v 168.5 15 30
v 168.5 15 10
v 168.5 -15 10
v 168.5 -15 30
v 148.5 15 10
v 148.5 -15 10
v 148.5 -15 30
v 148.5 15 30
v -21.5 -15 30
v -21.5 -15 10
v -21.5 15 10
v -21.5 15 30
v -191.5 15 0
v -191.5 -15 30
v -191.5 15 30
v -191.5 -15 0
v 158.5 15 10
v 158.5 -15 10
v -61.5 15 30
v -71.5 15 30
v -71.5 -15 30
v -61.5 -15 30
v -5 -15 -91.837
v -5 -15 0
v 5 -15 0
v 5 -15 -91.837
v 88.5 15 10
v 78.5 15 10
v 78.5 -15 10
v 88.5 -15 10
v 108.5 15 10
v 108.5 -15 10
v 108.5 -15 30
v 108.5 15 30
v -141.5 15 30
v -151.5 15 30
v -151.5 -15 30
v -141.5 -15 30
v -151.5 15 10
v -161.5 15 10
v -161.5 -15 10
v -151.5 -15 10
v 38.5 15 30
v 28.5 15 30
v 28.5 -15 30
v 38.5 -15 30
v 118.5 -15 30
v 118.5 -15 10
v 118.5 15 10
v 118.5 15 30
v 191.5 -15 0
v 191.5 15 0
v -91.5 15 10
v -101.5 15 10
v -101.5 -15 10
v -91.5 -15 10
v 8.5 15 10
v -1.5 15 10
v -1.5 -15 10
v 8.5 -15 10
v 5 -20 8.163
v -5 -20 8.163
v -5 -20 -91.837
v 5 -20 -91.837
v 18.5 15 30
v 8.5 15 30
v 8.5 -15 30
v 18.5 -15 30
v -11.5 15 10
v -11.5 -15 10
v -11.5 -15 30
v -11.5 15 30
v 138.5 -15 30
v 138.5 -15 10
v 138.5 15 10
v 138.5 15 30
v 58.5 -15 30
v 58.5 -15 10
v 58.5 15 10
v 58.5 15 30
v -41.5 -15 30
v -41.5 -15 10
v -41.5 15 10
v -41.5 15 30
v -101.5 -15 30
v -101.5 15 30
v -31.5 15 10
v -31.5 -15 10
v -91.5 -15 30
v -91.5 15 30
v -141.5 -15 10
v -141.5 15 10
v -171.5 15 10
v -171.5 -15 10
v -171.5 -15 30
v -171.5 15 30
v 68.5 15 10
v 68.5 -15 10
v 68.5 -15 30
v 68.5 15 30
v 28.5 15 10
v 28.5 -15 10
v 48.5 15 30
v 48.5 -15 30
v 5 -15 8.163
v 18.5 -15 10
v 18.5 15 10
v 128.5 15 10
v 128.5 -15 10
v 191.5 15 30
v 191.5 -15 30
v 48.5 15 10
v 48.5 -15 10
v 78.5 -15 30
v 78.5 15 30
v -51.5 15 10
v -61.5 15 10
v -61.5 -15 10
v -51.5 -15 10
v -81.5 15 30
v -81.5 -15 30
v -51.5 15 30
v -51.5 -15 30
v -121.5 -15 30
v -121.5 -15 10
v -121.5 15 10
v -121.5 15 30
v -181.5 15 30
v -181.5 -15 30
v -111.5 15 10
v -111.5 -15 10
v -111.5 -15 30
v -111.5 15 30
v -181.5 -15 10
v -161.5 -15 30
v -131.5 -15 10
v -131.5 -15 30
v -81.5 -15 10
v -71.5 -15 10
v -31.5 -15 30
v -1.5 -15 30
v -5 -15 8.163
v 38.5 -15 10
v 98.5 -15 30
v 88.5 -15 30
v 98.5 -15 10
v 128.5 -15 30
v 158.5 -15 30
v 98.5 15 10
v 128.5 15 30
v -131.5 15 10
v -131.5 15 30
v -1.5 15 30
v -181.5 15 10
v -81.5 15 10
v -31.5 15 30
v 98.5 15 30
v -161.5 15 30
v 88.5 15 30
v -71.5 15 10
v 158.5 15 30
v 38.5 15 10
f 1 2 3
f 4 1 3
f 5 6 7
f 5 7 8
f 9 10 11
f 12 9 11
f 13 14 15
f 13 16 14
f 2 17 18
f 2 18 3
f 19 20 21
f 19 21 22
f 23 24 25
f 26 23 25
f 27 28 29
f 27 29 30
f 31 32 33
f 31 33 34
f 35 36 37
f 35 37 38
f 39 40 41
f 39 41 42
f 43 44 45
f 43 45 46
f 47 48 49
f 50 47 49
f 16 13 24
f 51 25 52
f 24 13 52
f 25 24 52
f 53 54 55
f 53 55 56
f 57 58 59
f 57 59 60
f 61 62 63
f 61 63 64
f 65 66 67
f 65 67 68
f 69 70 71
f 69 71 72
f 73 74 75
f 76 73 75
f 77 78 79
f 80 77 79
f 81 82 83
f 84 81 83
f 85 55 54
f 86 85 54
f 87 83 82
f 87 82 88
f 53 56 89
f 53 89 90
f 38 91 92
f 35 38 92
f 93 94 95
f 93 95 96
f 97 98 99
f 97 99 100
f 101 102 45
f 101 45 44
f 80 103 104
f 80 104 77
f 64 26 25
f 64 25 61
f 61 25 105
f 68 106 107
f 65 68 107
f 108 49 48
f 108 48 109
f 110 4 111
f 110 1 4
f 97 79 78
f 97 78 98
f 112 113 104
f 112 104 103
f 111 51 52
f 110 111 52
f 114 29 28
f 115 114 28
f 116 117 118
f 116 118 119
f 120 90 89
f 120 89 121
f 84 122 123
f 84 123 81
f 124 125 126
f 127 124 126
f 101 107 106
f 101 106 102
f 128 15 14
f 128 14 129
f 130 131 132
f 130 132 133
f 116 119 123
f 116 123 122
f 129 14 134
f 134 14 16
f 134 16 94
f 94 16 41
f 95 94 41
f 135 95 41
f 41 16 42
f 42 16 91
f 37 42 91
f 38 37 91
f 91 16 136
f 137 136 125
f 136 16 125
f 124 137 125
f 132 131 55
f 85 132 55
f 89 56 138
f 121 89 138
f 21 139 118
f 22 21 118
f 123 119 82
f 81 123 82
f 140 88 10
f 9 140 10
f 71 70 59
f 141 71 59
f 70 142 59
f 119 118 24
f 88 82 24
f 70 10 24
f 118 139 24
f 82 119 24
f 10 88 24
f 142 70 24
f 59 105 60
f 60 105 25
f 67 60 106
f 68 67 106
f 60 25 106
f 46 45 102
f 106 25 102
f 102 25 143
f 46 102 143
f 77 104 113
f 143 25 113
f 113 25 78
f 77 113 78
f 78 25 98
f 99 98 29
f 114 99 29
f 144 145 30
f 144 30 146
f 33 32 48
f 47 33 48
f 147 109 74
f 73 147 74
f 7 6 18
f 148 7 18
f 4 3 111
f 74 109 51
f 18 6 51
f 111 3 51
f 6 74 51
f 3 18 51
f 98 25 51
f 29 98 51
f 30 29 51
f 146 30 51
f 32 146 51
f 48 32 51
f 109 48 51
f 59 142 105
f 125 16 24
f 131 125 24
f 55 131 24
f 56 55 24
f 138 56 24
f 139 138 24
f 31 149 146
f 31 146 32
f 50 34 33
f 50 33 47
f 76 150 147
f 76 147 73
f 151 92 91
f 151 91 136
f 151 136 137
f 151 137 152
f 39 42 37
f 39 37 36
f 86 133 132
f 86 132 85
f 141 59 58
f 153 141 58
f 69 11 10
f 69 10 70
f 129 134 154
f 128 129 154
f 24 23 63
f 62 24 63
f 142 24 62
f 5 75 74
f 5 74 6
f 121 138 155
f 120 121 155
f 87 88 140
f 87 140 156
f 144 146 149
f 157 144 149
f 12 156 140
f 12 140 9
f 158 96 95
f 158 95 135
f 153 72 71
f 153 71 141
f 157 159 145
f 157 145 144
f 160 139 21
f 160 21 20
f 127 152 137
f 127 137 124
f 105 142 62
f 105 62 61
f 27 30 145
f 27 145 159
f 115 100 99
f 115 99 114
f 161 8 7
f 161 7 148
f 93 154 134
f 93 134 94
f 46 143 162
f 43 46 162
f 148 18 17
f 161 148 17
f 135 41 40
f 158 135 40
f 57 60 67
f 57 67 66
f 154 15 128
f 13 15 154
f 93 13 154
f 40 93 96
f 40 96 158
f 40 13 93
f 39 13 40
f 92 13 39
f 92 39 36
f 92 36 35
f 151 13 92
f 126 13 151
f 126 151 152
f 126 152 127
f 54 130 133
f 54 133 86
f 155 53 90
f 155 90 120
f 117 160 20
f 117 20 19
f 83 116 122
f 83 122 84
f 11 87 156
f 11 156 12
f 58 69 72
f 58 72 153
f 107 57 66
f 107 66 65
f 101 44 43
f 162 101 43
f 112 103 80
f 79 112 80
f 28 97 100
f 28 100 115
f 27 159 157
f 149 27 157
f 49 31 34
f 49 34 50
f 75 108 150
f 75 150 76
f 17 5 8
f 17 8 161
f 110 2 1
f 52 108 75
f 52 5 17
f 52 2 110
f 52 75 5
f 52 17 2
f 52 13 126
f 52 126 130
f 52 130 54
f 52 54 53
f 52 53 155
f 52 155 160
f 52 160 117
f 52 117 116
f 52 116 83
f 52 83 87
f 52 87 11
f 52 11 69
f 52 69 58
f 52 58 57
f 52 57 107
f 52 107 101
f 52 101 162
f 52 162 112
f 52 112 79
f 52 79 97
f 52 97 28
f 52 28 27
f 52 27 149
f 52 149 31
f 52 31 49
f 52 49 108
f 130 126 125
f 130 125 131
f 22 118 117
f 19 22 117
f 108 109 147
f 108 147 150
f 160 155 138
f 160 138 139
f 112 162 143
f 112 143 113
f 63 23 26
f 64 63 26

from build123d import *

# Parameters (mm, degrees)
ESQUISSE1_W        = 383
ESQUISSE1_H        = 30
BOSS_EXTRU_1_DEPTH = 10
ESQUISSE2_W        = 10
ESQUISSE2_H        = 30
BOSS_EXTRU_2_DEPTH = 20
ESQUISSE3_W        = 10
ESQUISSE3_H        = 100
BOSS_EXTRU_3_DEPTH = 5


with BuildPart() as part:
    # Esquisse1 → Boss.-Extru.1 (new body)
    with BuildSketch(Plane.XY):
        Rectangle(ESQUISSE1_W, ESQUISSE1_H)
    extrude(amount=BOSS_EXTRU_1_DEPTH)

    # Esquisse2 → Boss.-Extru.2 (add)
    with BuildSketch(Plane.XY.offset(10)):
        with Locations((-186.5, 0)):
            Rectangle(ESQUISSE2_W, ESQUISSE2_H)
        with Locations((-166.5, 0)):
            Rectangle(ESQUISSE2_W, ESQUISSE2_H)
        with Locations((-146.5, 0)):
            Rectangle(ESQUISSE2_W, ESQUISSE2_H)
        with Locations((-126.5, 0)):
            Rectangle(ESQUISSE2_W, ESQUISSE2_H)
        with Locations((-106.5, 0)):
            Rectangle(ESQUISSE2_W, ESQUISSE2_H)
        with Locations((-86.5, 0)):
            Rectangle(ESQUISSE2_W, ESQUISSE2_H)
        with Locations((-66.5, 0)):
            Rectangle(ESQUISSE2_W, ESQUISSE2_H)
        with Locations((-46.5, 0)):
            Rectangle(ESQUISSE2_W, ESQUISSE2_H)
        with Locations((-26.5, 0)):
            Rectangle(ESQUISSE2_W, ESQUISSE2_H)
        with Locations((-6.5, 0)):
            Rectangle(ESQUISSE2_W, ESQUISSE2_H)
        with Locations((13.5, 0)):
            Rectangle(ESQUISSE2_W, ESQUISSE2_H)
        with Locations((33.5, 0)):
            Rectangle(ESQUISSE2_W, ESQUISSE2_H)
        with Locations((53.5, 0)):
            Rectangle(ESQUISSE2_W, ESQUISSE2_H)
        with Locations((73.5, 0)):
            Rectangle(ESQUISSE2_W, ESQUISSE2_H)
        with Locations((93.5, 0)):
            Rectangle(ESQUISSE2_W, ESQUISSE2_H)
        with Locations((113.5, 0)):
            Rectangle(ESQUISSE2_W, ESQUISSE2_H)
        with Locations((133.5, 0)):
            Rectangle(ESQUISSE2_W, ESQUISSE2_H)
        with Locations((153.5, 0)):
            Rectangle(ESQUISSE2_W, ESQUISSE2_H)
        Polygon((168.5, -15), (178.5, -15), (191.5, -15), (191.5, 15), (178.5, 15), (168.5, 15), align=None)
    extrude(amount=BOSS_EXTRU_2_DEPTH)

    # Esquisse3 → Boss.-Extru.3 (add)
    with BuildSketch(Plane.XZ.offset(15)):
        with Locations((0, -41.837008413)):
            Rectangle(ESQUISSE3_W, ESQUISSE3_H)
    extrude(amount=BOSS_EXTRU_3_DEPTH)


solid = part.part
